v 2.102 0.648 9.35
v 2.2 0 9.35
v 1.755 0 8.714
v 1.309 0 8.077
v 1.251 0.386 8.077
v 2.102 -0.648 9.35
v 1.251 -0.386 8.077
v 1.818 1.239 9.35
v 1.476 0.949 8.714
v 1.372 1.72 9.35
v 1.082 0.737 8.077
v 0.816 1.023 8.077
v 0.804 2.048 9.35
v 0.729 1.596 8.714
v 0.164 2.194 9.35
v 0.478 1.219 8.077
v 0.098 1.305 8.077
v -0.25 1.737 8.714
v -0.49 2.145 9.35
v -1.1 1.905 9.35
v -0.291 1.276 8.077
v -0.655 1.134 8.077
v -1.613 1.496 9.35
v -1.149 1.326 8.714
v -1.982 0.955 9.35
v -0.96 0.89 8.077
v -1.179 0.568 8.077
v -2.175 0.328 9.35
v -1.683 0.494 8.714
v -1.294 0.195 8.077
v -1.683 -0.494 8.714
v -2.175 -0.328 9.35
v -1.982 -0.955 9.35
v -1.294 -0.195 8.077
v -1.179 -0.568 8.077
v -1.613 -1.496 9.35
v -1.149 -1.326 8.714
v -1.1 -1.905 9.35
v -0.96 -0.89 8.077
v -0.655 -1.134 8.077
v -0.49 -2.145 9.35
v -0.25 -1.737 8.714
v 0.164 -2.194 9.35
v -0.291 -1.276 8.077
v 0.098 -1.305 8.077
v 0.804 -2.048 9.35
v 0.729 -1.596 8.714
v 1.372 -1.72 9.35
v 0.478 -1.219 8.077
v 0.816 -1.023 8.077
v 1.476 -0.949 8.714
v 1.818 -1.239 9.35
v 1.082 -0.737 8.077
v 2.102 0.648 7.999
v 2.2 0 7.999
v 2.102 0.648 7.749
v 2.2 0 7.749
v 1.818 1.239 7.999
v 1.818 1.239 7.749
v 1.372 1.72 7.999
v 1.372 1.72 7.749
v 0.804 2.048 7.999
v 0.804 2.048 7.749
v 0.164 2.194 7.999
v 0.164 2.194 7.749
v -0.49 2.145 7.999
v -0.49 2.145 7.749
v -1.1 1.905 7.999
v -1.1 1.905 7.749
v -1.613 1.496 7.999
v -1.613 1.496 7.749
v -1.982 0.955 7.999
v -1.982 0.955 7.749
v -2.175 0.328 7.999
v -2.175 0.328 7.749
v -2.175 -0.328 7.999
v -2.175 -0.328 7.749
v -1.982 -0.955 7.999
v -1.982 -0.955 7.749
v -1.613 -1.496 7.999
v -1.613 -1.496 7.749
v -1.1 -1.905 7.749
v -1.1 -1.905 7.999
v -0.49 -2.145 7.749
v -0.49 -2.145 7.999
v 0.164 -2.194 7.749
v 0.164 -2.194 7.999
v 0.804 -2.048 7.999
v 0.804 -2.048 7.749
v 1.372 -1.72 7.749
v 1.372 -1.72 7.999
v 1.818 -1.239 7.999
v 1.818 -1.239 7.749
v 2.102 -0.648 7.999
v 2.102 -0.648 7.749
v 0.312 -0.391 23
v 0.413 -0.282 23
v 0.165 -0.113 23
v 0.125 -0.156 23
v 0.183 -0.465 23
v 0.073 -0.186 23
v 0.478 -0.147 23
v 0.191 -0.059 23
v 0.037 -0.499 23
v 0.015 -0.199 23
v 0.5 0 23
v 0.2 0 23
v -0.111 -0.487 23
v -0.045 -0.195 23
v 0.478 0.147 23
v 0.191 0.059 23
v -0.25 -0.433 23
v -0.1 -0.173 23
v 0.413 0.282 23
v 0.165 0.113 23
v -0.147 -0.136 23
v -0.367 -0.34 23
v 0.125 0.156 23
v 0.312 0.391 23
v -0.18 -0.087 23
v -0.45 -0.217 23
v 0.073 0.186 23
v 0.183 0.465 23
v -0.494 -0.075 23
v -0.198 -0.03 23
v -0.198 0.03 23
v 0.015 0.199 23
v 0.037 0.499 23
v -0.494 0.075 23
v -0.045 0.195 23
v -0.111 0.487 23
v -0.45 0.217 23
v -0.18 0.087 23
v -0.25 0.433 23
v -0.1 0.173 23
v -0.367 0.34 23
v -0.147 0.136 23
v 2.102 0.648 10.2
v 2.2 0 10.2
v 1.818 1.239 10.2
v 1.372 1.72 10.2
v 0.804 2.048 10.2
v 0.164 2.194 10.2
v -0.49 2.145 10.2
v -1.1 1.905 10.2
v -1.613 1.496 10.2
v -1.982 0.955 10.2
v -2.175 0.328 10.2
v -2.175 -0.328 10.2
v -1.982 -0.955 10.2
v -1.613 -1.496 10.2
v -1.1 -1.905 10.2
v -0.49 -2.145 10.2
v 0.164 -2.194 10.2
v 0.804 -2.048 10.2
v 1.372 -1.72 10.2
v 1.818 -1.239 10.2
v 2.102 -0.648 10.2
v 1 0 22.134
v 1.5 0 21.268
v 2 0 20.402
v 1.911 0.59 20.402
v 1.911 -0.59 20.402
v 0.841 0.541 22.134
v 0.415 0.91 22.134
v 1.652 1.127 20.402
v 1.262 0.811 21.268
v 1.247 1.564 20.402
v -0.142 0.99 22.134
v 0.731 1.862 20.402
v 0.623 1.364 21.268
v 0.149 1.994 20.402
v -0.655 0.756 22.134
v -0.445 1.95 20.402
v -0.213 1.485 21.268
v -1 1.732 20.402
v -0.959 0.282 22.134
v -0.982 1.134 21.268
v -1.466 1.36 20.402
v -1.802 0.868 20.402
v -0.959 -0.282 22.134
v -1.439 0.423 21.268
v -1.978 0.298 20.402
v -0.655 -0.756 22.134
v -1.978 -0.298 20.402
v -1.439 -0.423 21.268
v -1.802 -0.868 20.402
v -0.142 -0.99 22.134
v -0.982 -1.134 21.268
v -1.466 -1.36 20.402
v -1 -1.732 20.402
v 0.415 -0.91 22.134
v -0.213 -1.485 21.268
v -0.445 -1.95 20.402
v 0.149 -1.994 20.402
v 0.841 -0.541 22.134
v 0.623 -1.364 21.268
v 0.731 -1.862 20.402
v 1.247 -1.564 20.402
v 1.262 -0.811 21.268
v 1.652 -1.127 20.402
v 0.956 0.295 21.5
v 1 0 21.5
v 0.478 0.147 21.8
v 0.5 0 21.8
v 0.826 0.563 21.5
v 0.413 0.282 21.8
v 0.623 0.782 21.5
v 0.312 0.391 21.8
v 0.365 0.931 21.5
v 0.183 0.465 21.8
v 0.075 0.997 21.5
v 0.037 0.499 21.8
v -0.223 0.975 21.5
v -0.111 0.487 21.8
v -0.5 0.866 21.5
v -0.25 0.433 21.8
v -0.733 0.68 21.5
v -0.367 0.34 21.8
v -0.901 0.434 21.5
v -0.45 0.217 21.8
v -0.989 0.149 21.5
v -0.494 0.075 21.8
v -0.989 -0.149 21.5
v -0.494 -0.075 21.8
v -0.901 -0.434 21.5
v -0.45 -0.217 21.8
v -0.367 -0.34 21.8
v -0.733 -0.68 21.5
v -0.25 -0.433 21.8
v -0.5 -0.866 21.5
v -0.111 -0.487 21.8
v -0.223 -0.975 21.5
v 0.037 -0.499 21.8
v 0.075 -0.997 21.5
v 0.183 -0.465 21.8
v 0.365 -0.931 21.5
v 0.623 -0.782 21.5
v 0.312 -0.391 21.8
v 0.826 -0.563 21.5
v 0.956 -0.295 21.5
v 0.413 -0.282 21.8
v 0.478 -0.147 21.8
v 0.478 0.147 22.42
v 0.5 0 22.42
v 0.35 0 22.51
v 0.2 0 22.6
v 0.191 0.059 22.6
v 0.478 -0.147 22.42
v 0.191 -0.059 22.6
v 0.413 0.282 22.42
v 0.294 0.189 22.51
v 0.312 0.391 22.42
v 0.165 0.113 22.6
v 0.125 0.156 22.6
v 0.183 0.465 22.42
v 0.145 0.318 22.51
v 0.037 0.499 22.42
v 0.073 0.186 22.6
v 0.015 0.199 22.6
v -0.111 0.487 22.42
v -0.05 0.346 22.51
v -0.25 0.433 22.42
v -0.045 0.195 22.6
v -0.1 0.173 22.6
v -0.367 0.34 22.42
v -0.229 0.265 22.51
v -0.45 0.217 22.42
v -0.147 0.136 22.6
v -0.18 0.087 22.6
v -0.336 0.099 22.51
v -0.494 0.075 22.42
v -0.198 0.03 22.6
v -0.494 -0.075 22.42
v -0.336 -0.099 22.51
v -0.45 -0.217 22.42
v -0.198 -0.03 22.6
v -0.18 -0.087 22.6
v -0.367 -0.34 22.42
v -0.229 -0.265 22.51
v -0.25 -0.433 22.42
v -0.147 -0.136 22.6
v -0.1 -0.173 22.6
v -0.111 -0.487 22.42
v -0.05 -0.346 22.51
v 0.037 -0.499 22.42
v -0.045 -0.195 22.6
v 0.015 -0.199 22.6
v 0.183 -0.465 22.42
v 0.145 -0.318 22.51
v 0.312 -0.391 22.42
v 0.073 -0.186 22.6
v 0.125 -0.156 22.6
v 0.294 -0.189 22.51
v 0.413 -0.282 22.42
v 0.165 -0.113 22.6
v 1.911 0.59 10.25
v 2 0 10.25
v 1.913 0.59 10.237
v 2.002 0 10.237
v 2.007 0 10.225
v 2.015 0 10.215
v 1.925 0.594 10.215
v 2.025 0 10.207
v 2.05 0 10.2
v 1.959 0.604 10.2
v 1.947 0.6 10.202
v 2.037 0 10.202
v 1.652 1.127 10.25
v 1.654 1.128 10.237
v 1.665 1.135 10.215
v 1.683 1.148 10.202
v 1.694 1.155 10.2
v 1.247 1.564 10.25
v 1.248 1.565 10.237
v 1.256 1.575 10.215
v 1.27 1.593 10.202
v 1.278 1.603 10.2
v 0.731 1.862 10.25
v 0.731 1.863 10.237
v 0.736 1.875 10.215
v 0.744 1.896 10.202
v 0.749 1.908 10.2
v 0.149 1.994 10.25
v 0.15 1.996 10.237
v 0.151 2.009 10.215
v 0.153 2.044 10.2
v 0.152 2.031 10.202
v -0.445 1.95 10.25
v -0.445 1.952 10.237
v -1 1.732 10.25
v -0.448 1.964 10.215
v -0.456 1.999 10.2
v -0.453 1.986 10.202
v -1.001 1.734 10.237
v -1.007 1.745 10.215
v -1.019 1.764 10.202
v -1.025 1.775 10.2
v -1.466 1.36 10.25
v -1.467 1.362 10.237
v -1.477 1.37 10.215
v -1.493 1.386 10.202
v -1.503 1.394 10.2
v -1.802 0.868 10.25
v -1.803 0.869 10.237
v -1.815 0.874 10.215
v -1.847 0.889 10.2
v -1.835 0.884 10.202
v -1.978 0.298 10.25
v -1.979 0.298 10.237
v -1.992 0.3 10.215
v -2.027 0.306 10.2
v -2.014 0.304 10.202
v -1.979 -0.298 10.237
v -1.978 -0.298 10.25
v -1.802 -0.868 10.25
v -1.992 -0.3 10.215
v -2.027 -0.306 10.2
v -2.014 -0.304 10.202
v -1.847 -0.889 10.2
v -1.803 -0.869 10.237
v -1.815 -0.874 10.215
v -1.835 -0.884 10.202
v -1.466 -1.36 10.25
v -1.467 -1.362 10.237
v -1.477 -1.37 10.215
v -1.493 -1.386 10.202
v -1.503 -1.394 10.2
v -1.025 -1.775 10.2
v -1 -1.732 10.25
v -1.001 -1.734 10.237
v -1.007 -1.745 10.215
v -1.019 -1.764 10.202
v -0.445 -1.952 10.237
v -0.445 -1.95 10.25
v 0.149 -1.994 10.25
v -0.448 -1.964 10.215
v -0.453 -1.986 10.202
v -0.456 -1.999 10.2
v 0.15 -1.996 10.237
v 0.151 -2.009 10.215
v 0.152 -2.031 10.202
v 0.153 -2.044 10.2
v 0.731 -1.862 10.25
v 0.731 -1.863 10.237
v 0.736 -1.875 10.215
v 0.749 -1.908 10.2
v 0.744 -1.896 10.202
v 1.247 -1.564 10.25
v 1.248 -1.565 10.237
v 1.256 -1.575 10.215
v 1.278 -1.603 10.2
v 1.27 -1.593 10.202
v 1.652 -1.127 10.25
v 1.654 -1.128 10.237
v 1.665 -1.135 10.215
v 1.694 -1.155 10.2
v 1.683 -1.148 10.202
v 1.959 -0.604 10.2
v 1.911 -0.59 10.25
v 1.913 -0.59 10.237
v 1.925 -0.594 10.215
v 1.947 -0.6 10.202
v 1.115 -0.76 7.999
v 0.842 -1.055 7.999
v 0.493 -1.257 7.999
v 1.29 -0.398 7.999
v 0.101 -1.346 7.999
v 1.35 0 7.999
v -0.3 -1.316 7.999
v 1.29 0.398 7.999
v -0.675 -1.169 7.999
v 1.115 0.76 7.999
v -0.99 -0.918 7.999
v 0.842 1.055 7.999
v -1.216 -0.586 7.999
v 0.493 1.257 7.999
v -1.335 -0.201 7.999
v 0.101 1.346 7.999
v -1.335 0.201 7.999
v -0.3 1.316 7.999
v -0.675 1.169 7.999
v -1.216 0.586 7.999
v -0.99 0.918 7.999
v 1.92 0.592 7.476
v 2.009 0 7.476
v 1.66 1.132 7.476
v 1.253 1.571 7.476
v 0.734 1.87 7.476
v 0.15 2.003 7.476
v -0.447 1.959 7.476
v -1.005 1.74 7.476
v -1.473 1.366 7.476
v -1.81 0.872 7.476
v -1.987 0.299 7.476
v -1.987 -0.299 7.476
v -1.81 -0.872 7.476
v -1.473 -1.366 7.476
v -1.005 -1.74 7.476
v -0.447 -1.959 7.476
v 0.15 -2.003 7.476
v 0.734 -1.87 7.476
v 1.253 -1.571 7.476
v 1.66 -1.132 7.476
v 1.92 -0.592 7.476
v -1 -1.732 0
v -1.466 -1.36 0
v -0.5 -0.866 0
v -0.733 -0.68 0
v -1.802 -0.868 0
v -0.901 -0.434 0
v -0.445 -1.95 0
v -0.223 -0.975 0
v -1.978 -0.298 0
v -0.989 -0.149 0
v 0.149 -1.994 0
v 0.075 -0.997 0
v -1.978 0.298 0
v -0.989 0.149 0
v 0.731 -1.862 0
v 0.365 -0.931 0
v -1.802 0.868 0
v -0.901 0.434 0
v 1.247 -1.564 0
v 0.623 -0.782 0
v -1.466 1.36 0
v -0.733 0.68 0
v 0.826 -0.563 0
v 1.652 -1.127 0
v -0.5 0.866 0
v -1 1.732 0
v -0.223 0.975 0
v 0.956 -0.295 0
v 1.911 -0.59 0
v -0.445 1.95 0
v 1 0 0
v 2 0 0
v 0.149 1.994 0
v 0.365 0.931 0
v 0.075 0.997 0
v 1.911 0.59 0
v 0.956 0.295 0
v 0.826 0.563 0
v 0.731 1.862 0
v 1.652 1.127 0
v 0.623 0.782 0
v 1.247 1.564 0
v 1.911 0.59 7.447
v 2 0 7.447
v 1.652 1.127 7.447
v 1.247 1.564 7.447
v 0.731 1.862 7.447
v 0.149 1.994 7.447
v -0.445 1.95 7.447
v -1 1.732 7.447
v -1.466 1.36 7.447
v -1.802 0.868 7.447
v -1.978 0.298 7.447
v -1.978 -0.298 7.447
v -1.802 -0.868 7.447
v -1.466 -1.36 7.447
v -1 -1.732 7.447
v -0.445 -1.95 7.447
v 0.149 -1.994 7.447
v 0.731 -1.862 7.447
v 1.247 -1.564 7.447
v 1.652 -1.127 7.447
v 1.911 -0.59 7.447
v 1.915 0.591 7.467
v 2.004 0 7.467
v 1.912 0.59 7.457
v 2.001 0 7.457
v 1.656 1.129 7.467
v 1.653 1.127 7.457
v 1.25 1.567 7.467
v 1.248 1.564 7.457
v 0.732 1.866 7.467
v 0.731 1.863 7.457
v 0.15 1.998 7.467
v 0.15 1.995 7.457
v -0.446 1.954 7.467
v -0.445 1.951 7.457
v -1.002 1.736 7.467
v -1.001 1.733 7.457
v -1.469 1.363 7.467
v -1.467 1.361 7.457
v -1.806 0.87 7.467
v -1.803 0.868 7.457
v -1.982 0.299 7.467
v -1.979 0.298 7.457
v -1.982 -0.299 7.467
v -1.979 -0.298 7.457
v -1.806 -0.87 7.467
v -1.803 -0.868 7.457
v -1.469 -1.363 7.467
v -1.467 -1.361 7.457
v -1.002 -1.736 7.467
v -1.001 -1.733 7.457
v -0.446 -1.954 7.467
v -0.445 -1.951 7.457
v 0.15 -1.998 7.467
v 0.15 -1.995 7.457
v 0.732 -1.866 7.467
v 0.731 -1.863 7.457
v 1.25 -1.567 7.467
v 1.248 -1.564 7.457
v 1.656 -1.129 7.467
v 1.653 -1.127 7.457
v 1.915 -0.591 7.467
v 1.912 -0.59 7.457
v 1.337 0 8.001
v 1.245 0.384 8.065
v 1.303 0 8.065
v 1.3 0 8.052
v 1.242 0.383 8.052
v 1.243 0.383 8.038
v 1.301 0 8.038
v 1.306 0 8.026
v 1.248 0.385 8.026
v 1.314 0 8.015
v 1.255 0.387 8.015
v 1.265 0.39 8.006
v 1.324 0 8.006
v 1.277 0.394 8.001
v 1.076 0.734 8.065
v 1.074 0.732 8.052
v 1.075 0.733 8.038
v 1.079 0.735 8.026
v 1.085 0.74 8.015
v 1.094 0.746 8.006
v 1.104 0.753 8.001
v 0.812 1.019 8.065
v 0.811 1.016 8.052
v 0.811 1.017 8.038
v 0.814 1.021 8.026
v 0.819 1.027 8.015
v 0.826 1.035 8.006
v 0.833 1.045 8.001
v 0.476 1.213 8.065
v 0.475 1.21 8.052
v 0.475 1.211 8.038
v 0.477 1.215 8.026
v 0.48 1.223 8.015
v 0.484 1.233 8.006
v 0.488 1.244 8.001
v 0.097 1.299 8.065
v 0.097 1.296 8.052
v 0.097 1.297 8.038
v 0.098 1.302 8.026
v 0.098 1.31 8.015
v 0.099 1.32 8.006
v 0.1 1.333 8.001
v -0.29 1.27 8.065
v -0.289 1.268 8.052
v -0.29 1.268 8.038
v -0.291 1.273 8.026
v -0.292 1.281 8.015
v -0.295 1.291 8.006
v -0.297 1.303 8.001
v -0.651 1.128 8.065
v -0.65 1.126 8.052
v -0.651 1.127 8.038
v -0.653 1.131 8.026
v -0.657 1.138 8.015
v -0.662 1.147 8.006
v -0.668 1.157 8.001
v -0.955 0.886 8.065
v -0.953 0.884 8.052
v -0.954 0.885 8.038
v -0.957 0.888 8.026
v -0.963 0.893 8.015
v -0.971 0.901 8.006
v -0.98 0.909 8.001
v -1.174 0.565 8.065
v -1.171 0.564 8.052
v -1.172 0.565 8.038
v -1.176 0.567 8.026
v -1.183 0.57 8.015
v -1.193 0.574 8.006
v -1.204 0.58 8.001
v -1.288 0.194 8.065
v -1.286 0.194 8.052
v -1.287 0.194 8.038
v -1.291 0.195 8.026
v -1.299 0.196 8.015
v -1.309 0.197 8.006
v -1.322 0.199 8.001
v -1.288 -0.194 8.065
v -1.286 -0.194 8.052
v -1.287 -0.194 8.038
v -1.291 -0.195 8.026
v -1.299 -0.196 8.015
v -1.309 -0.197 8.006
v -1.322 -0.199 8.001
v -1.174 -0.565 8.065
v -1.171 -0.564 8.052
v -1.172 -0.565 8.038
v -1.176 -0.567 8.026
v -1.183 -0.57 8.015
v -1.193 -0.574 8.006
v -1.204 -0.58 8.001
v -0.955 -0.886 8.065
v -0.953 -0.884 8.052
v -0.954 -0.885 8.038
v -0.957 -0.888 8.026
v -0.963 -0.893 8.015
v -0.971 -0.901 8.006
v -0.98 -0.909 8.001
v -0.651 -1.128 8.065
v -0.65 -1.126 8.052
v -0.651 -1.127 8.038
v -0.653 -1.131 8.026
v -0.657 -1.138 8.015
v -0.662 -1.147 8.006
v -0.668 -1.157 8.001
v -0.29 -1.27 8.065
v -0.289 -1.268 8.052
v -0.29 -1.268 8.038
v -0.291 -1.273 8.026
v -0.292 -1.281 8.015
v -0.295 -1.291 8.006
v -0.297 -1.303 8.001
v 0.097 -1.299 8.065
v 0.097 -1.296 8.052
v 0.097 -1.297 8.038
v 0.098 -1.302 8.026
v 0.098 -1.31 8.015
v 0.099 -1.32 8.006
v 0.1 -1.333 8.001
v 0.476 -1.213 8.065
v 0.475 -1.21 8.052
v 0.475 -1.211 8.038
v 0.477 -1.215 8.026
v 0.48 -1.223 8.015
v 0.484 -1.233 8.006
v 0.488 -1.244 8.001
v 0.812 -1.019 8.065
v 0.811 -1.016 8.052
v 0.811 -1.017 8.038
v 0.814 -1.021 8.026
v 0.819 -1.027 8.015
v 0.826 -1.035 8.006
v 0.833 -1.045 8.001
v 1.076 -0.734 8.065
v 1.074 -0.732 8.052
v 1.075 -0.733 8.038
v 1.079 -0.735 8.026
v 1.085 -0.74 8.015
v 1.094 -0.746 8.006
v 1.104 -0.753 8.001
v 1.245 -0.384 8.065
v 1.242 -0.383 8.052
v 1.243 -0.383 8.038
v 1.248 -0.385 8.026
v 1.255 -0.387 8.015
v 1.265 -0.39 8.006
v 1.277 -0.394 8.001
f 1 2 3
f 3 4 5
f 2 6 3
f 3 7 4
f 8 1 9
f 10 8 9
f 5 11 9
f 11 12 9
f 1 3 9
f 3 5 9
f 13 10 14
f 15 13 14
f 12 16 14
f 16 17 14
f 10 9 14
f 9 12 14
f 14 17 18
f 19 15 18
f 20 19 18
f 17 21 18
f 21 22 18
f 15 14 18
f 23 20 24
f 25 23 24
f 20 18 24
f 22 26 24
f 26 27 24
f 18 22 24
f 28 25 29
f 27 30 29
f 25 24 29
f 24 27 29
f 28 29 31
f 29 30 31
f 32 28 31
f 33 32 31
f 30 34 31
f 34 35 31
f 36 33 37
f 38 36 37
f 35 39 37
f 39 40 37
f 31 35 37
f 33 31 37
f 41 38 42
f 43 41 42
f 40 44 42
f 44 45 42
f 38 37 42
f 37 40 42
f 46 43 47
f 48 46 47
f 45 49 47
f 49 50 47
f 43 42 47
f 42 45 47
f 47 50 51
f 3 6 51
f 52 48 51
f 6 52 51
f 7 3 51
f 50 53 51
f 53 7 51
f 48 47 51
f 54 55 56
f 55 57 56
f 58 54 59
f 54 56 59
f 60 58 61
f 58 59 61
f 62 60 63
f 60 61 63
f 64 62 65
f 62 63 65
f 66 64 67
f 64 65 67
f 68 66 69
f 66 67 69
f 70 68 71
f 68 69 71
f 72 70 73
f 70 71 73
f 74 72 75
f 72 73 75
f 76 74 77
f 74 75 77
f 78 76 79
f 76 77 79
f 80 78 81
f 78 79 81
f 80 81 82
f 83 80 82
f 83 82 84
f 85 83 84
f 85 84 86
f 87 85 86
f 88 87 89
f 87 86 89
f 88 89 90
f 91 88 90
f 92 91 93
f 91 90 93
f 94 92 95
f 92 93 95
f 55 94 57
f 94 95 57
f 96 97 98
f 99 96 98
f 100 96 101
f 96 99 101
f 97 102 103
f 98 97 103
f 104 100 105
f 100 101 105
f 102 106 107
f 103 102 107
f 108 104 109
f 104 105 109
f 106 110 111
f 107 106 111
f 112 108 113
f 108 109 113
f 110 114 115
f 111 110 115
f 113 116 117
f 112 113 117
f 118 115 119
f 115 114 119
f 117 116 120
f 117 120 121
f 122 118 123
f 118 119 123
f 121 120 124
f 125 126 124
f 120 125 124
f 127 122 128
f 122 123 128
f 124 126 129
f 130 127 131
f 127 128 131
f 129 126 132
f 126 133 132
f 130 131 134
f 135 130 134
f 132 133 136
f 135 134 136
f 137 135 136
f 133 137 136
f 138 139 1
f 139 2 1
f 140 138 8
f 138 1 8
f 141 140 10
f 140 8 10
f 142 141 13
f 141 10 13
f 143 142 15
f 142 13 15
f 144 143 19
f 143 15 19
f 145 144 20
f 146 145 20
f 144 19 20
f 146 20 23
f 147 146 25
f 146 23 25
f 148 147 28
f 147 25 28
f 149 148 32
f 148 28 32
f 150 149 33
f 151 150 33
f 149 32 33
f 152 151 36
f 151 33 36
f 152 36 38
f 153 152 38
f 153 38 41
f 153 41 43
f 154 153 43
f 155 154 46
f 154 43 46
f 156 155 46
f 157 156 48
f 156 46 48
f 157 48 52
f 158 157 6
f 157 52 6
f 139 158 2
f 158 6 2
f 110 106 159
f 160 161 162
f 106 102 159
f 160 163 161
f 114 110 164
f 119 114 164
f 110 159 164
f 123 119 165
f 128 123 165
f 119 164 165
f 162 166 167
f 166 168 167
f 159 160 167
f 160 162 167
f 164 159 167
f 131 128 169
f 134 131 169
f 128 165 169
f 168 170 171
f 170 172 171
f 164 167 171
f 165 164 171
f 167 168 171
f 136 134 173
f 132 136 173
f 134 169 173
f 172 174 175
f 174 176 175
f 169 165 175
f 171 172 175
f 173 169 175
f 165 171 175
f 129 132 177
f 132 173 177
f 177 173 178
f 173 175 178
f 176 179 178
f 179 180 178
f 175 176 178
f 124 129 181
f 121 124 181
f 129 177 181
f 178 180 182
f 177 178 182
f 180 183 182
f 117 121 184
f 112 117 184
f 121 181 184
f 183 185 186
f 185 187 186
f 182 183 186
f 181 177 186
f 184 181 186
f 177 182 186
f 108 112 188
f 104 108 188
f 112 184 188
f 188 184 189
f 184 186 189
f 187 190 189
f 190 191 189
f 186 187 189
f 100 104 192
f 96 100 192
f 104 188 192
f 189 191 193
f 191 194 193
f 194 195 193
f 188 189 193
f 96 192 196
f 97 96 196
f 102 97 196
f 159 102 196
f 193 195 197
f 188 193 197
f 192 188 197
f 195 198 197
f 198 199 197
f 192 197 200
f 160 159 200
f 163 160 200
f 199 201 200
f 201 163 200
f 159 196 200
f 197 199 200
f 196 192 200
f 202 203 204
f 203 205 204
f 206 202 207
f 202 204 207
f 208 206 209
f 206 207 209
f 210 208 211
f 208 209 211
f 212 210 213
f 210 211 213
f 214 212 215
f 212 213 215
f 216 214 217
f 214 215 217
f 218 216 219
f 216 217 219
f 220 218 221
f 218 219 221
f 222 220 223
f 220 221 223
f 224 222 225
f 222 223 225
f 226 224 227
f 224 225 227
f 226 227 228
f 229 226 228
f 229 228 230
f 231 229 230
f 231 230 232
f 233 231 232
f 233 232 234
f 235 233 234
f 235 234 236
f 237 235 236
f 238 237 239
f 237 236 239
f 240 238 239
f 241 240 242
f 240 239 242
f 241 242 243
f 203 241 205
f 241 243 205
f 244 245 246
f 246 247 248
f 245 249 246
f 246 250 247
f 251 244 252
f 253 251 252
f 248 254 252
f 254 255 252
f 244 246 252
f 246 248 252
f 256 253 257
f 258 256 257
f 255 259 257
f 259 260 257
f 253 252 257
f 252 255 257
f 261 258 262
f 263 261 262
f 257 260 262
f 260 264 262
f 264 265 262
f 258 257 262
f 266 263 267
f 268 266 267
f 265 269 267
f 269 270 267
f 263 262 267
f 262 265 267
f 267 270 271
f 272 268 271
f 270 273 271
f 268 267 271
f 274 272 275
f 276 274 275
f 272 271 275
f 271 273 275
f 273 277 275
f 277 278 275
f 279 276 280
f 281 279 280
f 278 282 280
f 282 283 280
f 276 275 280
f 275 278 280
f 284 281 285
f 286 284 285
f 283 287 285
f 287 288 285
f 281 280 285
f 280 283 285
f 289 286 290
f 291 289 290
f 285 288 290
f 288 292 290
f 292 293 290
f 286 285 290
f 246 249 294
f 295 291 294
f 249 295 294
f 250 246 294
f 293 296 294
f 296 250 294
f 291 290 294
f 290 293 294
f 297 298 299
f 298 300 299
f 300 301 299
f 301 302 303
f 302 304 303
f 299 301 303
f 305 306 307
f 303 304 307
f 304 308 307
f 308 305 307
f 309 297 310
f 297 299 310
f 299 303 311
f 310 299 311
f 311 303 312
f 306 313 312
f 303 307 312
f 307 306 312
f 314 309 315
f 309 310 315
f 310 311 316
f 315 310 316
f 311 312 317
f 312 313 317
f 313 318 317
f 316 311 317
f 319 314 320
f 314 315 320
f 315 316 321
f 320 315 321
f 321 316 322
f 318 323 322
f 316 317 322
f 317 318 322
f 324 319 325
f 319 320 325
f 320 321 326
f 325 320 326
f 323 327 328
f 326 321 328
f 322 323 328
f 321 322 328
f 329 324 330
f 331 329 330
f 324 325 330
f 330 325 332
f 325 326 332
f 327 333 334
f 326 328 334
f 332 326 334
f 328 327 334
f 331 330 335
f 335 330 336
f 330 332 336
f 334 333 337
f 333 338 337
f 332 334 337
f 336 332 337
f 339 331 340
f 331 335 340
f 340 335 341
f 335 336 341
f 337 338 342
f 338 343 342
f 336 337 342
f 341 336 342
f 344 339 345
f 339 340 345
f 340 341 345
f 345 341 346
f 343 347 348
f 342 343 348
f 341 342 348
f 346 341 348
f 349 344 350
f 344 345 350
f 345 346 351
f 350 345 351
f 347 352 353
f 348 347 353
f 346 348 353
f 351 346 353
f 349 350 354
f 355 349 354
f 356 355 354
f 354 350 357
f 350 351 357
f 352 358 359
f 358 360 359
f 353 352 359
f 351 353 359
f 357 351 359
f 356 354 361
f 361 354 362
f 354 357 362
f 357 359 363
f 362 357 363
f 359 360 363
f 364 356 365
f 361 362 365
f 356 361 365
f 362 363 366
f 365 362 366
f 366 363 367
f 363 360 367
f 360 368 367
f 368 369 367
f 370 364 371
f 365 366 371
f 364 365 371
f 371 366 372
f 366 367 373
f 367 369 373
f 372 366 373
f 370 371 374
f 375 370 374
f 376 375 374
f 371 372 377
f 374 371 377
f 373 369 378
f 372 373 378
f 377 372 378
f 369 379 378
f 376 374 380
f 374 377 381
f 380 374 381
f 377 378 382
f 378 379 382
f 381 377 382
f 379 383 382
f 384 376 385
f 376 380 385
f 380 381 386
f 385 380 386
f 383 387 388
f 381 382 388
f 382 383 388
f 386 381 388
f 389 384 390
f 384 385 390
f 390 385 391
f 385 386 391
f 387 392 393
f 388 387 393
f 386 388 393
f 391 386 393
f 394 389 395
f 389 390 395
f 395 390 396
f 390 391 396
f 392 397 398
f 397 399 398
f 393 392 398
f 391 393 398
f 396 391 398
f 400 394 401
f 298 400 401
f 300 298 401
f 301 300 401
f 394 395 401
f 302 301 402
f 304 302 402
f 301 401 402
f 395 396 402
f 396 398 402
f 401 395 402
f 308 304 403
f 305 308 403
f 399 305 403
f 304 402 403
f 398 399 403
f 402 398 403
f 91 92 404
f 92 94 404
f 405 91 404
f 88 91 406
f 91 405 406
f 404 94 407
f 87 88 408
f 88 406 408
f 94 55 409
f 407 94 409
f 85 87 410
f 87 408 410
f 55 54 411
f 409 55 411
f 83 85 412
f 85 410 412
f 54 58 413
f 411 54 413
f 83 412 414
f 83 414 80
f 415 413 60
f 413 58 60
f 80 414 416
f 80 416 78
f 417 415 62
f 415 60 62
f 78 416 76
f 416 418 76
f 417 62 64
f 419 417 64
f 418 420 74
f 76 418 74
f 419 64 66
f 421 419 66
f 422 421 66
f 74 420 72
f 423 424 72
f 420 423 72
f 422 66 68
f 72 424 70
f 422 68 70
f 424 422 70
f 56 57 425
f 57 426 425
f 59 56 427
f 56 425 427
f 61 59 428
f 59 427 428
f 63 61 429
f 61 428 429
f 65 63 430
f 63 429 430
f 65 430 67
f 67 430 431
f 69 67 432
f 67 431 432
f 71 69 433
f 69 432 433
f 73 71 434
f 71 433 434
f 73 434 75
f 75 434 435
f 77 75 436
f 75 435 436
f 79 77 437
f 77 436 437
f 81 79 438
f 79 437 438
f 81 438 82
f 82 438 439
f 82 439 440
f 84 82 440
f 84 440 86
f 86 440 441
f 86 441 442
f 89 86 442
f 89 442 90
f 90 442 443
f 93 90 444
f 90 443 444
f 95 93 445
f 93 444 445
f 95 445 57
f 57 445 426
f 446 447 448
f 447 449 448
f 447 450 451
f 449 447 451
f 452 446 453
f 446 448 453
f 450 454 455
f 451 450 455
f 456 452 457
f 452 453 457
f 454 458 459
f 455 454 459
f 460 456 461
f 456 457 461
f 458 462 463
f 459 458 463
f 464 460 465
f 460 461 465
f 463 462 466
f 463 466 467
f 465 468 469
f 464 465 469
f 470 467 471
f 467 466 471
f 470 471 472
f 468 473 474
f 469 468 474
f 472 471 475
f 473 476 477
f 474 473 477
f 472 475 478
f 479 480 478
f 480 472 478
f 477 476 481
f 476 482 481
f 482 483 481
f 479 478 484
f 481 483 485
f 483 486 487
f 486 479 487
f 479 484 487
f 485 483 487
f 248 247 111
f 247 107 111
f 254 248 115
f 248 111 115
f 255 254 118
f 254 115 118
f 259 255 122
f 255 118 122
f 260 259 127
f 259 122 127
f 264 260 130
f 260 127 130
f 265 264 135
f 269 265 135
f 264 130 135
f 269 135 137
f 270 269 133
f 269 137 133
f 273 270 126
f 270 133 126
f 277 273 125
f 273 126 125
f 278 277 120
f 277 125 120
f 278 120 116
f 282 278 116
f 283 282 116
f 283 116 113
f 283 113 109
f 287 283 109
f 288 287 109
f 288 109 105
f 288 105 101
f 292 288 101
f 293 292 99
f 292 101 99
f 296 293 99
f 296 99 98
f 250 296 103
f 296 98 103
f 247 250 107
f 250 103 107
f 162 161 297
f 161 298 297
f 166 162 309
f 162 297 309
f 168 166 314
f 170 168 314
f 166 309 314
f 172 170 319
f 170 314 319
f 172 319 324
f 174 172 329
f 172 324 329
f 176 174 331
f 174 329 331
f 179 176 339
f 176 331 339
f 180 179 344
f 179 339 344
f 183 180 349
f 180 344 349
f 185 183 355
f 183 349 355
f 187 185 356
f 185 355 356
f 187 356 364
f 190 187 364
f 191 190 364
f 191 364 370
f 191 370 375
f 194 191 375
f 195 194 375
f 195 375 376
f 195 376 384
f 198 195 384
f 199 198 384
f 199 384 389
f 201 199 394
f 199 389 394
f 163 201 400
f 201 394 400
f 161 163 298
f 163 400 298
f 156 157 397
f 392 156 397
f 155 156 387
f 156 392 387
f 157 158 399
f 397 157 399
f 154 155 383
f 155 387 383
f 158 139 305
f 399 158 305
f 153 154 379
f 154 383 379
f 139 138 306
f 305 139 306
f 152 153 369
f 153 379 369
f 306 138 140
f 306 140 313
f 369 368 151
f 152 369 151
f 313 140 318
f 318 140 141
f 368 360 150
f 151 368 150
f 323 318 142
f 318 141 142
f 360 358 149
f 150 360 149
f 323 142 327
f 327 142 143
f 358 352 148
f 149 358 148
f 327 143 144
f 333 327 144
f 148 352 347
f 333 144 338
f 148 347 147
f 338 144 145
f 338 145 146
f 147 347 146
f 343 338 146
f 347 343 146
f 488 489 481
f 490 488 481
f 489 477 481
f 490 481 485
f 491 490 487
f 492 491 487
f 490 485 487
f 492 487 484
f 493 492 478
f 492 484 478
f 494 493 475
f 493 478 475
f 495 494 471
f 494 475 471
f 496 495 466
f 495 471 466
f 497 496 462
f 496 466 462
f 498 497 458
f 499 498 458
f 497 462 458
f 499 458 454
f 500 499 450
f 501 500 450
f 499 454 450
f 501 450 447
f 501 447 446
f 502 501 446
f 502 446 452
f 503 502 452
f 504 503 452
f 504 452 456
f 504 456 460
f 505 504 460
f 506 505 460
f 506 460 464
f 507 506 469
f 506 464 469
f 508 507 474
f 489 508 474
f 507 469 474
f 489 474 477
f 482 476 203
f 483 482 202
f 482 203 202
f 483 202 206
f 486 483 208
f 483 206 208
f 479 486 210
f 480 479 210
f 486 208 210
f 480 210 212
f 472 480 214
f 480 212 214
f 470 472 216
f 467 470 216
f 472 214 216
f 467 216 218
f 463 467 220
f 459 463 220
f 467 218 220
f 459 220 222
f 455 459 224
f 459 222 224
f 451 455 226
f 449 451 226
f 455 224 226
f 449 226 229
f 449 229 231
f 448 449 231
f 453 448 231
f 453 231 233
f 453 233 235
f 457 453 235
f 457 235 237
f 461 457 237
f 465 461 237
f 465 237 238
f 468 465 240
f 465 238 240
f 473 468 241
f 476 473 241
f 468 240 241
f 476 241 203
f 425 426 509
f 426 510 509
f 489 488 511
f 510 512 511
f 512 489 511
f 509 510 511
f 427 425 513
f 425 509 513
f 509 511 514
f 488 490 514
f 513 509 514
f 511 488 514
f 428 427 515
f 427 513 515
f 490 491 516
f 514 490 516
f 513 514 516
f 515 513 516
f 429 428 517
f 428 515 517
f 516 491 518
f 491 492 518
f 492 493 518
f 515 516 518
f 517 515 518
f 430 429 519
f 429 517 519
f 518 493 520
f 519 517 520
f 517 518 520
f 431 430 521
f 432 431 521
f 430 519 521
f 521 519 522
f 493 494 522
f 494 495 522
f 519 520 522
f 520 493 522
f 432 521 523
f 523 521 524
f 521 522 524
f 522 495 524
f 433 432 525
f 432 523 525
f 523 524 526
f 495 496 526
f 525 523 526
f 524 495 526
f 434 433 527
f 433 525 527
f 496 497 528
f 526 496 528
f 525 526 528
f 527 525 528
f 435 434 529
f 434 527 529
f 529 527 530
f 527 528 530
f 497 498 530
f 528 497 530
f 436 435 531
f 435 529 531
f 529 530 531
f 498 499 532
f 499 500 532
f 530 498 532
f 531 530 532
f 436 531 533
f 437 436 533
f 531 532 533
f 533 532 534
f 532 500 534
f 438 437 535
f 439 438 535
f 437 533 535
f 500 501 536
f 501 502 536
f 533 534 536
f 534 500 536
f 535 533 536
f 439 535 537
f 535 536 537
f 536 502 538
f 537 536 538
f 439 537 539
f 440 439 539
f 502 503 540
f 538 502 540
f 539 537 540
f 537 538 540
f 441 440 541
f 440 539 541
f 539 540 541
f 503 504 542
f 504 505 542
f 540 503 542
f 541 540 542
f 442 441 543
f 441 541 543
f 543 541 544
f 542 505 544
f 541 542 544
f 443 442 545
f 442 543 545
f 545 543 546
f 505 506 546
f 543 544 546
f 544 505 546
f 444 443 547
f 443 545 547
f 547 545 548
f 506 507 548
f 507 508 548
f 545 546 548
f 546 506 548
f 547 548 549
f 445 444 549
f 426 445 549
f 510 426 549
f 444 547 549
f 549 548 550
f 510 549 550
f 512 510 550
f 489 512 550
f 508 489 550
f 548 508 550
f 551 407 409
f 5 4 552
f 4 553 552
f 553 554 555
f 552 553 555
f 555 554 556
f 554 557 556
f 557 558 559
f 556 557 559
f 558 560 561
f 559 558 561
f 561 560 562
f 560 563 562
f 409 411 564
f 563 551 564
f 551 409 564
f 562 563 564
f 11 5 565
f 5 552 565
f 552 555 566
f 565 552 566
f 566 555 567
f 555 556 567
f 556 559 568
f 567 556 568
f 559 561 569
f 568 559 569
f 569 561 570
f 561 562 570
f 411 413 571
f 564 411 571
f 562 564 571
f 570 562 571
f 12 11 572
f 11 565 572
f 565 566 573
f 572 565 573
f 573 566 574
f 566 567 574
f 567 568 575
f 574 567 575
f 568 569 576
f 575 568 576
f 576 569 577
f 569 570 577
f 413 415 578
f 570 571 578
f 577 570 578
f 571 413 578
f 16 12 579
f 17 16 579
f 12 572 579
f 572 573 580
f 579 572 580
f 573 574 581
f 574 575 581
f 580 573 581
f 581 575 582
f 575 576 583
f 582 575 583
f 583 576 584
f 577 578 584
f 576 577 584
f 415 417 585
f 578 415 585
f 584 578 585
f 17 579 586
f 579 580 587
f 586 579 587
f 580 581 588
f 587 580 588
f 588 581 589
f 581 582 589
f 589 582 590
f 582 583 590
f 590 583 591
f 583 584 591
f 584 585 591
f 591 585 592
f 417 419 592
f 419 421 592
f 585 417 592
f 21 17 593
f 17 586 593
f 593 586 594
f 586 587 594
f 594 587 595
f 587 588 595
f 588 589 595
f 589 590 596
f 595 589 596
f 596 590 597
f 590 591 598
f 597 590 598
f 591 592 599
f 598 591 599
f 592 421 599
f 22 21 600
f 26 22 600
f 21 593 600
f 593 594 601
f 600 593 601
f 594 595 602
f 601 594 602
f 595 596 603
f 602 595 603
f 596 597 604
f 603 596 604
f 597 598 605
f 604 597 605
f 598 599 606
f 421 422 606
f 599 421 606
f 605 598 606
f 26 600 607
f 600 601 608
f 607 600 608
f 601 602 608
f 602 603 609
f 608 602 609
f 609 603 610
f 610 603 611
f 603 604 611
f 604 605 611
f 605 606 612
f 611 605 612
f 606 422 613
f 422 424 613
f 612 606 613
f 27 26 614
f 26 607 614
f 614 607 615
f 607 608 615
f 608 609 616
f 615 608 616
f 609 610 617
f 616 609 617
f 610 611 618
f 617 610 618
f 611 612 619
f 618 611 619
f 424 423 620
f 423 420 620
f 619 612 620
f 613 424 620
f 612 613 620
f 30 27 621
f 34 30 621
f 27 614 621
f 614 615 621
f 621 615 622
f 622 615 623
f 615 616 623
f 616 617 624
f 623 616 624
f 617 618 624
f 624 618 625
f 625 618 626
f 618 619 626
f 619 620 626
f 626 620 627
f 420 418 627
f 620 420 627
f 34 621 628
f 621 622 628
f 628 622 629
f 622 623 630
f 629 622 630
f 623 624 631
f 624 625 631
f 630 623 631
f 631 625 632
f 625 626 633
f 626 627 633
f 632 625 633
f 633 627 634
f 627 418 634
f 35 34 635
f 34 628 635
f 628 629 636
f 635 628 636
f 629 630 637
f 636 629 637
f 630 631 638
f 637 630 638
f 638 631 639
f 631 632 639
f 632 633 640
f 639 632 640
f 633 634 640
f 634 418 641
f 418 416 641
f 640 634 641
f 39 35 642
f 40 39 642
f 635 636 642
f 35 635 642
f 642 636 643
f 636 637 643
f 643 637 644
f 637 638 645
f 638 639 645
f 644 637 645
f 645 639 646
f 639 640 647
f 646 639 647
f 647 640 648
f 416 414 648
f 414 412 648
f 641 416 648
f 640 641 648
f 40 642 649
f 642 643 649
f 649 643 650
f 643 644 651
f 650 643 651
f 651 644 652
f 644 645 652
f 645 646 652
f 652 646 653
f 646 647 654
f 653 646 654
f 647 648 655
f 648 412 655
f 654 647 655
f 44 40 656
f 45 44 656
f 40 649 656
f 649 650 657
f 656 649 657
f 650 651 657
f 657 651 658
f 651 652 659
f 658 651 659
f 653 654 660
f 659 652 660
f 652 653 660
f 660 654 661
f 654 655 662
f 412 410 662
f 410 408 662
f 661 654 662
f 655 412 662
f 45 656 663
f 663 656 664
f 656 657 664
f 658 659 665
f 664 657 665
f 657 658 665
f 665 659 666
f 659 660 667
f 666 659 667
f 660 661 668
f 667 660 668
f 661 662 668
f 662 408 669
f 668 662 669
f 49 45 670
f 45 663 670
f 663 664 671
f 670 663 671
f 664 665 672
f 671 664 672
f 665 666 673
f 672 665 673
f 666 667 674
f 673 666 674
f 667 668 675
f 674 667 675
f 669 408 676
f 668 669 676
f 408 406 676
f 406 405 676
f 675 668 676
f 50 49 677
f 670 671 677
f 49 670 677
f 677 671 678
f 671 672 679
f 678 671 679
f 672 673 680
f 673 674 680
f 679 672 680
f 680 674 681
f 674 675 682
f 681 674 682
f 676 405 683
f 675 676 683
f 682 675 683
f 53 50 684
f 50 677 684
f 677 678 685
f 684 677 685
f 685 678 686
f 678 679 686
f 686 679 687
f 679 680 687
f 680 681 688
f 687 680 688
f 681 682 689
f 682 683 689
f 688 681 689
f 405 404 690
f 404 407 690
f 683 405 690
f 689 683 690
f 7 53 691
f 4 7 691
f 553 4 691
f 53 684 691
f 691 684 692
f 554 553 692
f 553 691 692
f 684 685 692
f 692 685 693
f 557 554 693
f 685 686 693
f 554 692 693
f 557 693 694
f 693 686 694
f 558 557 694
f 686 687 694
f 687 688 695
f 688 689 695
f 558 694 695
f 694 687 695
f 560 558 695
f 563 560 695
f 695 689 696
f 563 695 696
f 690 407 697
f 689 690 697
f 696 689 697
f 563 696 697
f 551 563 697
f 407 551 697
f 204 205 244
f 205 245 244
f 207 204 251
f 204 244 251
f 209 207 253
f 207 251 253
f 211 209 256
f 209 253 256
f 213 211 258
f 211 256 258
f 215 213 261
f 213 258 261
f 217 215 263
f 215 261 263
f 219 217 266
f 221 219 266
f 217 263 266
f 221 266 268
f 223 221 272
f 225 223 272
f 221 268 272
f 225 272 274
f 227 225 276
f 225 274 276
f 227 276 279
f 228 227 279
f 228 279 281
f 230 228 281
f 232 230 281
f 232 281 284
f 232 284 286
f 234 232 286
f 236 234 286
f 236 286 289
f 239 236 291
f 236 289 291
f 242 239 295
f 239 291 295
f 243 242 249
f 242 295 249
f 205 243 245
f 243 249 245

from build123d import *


with BuildPart() as part:
    # Sketch1 → Revolve1 (revolve)
    with BuildSketch(Plane(origin=(0, 0, 0), x_dir=(1, 0, 0), z_dir=(0, 1, 0))):
        with BuildLine():
            Line((0.5, -23), (2, -20.401923789))
            Line((2, -20.401923789), (2, -10.25))
            ThreePointArc((2, -10.25), (2.014644661, -10.214644661), (2.05, -10.2))
            Line((2.05, -10.2), (2.2, -10.2))
            Line((2.2, -10.2), (2.2, -9.349807217))
            Line((2.2, -9.349807217), (1.309042398, -8.077387893))
            ThreePointArc((1.309042398, -8.077387893), (1.305649458, -8.025621641), (1.35, -7.998709071))
            Line((1.35, -7.998709071), (2.2, -7.998709071))
            Line((2.2, -7.998709071), (2.2, -7.748709071))
            Line((2.2, -7.748709071), (2.009042398, -7.475993352))
            ThreePointArc((2.009042398, -7.475993352), (2.002314152, -7.462349821), (2, -7.447314531))
            Line((2, -7.447314531), (2, 0))
            Line((2, 0), (1, 0))
            Line((1, 0), (1, -21.49956969))
            Line((1, -21.49956969), (0.5, -21.8))
            Line((0.5, -21.8), (0.5, -22.419741814))
            Line((0.5, -22.419741814), (0.2, -22.6))
            Line((0.2, -22.6), (0.2, -23))
            Line((0.2, -23), (0.5, -23))
        make_face()
    revolve(axis=Axis((0, 0, 0), (0, 0, 1)))


solid = part.part
